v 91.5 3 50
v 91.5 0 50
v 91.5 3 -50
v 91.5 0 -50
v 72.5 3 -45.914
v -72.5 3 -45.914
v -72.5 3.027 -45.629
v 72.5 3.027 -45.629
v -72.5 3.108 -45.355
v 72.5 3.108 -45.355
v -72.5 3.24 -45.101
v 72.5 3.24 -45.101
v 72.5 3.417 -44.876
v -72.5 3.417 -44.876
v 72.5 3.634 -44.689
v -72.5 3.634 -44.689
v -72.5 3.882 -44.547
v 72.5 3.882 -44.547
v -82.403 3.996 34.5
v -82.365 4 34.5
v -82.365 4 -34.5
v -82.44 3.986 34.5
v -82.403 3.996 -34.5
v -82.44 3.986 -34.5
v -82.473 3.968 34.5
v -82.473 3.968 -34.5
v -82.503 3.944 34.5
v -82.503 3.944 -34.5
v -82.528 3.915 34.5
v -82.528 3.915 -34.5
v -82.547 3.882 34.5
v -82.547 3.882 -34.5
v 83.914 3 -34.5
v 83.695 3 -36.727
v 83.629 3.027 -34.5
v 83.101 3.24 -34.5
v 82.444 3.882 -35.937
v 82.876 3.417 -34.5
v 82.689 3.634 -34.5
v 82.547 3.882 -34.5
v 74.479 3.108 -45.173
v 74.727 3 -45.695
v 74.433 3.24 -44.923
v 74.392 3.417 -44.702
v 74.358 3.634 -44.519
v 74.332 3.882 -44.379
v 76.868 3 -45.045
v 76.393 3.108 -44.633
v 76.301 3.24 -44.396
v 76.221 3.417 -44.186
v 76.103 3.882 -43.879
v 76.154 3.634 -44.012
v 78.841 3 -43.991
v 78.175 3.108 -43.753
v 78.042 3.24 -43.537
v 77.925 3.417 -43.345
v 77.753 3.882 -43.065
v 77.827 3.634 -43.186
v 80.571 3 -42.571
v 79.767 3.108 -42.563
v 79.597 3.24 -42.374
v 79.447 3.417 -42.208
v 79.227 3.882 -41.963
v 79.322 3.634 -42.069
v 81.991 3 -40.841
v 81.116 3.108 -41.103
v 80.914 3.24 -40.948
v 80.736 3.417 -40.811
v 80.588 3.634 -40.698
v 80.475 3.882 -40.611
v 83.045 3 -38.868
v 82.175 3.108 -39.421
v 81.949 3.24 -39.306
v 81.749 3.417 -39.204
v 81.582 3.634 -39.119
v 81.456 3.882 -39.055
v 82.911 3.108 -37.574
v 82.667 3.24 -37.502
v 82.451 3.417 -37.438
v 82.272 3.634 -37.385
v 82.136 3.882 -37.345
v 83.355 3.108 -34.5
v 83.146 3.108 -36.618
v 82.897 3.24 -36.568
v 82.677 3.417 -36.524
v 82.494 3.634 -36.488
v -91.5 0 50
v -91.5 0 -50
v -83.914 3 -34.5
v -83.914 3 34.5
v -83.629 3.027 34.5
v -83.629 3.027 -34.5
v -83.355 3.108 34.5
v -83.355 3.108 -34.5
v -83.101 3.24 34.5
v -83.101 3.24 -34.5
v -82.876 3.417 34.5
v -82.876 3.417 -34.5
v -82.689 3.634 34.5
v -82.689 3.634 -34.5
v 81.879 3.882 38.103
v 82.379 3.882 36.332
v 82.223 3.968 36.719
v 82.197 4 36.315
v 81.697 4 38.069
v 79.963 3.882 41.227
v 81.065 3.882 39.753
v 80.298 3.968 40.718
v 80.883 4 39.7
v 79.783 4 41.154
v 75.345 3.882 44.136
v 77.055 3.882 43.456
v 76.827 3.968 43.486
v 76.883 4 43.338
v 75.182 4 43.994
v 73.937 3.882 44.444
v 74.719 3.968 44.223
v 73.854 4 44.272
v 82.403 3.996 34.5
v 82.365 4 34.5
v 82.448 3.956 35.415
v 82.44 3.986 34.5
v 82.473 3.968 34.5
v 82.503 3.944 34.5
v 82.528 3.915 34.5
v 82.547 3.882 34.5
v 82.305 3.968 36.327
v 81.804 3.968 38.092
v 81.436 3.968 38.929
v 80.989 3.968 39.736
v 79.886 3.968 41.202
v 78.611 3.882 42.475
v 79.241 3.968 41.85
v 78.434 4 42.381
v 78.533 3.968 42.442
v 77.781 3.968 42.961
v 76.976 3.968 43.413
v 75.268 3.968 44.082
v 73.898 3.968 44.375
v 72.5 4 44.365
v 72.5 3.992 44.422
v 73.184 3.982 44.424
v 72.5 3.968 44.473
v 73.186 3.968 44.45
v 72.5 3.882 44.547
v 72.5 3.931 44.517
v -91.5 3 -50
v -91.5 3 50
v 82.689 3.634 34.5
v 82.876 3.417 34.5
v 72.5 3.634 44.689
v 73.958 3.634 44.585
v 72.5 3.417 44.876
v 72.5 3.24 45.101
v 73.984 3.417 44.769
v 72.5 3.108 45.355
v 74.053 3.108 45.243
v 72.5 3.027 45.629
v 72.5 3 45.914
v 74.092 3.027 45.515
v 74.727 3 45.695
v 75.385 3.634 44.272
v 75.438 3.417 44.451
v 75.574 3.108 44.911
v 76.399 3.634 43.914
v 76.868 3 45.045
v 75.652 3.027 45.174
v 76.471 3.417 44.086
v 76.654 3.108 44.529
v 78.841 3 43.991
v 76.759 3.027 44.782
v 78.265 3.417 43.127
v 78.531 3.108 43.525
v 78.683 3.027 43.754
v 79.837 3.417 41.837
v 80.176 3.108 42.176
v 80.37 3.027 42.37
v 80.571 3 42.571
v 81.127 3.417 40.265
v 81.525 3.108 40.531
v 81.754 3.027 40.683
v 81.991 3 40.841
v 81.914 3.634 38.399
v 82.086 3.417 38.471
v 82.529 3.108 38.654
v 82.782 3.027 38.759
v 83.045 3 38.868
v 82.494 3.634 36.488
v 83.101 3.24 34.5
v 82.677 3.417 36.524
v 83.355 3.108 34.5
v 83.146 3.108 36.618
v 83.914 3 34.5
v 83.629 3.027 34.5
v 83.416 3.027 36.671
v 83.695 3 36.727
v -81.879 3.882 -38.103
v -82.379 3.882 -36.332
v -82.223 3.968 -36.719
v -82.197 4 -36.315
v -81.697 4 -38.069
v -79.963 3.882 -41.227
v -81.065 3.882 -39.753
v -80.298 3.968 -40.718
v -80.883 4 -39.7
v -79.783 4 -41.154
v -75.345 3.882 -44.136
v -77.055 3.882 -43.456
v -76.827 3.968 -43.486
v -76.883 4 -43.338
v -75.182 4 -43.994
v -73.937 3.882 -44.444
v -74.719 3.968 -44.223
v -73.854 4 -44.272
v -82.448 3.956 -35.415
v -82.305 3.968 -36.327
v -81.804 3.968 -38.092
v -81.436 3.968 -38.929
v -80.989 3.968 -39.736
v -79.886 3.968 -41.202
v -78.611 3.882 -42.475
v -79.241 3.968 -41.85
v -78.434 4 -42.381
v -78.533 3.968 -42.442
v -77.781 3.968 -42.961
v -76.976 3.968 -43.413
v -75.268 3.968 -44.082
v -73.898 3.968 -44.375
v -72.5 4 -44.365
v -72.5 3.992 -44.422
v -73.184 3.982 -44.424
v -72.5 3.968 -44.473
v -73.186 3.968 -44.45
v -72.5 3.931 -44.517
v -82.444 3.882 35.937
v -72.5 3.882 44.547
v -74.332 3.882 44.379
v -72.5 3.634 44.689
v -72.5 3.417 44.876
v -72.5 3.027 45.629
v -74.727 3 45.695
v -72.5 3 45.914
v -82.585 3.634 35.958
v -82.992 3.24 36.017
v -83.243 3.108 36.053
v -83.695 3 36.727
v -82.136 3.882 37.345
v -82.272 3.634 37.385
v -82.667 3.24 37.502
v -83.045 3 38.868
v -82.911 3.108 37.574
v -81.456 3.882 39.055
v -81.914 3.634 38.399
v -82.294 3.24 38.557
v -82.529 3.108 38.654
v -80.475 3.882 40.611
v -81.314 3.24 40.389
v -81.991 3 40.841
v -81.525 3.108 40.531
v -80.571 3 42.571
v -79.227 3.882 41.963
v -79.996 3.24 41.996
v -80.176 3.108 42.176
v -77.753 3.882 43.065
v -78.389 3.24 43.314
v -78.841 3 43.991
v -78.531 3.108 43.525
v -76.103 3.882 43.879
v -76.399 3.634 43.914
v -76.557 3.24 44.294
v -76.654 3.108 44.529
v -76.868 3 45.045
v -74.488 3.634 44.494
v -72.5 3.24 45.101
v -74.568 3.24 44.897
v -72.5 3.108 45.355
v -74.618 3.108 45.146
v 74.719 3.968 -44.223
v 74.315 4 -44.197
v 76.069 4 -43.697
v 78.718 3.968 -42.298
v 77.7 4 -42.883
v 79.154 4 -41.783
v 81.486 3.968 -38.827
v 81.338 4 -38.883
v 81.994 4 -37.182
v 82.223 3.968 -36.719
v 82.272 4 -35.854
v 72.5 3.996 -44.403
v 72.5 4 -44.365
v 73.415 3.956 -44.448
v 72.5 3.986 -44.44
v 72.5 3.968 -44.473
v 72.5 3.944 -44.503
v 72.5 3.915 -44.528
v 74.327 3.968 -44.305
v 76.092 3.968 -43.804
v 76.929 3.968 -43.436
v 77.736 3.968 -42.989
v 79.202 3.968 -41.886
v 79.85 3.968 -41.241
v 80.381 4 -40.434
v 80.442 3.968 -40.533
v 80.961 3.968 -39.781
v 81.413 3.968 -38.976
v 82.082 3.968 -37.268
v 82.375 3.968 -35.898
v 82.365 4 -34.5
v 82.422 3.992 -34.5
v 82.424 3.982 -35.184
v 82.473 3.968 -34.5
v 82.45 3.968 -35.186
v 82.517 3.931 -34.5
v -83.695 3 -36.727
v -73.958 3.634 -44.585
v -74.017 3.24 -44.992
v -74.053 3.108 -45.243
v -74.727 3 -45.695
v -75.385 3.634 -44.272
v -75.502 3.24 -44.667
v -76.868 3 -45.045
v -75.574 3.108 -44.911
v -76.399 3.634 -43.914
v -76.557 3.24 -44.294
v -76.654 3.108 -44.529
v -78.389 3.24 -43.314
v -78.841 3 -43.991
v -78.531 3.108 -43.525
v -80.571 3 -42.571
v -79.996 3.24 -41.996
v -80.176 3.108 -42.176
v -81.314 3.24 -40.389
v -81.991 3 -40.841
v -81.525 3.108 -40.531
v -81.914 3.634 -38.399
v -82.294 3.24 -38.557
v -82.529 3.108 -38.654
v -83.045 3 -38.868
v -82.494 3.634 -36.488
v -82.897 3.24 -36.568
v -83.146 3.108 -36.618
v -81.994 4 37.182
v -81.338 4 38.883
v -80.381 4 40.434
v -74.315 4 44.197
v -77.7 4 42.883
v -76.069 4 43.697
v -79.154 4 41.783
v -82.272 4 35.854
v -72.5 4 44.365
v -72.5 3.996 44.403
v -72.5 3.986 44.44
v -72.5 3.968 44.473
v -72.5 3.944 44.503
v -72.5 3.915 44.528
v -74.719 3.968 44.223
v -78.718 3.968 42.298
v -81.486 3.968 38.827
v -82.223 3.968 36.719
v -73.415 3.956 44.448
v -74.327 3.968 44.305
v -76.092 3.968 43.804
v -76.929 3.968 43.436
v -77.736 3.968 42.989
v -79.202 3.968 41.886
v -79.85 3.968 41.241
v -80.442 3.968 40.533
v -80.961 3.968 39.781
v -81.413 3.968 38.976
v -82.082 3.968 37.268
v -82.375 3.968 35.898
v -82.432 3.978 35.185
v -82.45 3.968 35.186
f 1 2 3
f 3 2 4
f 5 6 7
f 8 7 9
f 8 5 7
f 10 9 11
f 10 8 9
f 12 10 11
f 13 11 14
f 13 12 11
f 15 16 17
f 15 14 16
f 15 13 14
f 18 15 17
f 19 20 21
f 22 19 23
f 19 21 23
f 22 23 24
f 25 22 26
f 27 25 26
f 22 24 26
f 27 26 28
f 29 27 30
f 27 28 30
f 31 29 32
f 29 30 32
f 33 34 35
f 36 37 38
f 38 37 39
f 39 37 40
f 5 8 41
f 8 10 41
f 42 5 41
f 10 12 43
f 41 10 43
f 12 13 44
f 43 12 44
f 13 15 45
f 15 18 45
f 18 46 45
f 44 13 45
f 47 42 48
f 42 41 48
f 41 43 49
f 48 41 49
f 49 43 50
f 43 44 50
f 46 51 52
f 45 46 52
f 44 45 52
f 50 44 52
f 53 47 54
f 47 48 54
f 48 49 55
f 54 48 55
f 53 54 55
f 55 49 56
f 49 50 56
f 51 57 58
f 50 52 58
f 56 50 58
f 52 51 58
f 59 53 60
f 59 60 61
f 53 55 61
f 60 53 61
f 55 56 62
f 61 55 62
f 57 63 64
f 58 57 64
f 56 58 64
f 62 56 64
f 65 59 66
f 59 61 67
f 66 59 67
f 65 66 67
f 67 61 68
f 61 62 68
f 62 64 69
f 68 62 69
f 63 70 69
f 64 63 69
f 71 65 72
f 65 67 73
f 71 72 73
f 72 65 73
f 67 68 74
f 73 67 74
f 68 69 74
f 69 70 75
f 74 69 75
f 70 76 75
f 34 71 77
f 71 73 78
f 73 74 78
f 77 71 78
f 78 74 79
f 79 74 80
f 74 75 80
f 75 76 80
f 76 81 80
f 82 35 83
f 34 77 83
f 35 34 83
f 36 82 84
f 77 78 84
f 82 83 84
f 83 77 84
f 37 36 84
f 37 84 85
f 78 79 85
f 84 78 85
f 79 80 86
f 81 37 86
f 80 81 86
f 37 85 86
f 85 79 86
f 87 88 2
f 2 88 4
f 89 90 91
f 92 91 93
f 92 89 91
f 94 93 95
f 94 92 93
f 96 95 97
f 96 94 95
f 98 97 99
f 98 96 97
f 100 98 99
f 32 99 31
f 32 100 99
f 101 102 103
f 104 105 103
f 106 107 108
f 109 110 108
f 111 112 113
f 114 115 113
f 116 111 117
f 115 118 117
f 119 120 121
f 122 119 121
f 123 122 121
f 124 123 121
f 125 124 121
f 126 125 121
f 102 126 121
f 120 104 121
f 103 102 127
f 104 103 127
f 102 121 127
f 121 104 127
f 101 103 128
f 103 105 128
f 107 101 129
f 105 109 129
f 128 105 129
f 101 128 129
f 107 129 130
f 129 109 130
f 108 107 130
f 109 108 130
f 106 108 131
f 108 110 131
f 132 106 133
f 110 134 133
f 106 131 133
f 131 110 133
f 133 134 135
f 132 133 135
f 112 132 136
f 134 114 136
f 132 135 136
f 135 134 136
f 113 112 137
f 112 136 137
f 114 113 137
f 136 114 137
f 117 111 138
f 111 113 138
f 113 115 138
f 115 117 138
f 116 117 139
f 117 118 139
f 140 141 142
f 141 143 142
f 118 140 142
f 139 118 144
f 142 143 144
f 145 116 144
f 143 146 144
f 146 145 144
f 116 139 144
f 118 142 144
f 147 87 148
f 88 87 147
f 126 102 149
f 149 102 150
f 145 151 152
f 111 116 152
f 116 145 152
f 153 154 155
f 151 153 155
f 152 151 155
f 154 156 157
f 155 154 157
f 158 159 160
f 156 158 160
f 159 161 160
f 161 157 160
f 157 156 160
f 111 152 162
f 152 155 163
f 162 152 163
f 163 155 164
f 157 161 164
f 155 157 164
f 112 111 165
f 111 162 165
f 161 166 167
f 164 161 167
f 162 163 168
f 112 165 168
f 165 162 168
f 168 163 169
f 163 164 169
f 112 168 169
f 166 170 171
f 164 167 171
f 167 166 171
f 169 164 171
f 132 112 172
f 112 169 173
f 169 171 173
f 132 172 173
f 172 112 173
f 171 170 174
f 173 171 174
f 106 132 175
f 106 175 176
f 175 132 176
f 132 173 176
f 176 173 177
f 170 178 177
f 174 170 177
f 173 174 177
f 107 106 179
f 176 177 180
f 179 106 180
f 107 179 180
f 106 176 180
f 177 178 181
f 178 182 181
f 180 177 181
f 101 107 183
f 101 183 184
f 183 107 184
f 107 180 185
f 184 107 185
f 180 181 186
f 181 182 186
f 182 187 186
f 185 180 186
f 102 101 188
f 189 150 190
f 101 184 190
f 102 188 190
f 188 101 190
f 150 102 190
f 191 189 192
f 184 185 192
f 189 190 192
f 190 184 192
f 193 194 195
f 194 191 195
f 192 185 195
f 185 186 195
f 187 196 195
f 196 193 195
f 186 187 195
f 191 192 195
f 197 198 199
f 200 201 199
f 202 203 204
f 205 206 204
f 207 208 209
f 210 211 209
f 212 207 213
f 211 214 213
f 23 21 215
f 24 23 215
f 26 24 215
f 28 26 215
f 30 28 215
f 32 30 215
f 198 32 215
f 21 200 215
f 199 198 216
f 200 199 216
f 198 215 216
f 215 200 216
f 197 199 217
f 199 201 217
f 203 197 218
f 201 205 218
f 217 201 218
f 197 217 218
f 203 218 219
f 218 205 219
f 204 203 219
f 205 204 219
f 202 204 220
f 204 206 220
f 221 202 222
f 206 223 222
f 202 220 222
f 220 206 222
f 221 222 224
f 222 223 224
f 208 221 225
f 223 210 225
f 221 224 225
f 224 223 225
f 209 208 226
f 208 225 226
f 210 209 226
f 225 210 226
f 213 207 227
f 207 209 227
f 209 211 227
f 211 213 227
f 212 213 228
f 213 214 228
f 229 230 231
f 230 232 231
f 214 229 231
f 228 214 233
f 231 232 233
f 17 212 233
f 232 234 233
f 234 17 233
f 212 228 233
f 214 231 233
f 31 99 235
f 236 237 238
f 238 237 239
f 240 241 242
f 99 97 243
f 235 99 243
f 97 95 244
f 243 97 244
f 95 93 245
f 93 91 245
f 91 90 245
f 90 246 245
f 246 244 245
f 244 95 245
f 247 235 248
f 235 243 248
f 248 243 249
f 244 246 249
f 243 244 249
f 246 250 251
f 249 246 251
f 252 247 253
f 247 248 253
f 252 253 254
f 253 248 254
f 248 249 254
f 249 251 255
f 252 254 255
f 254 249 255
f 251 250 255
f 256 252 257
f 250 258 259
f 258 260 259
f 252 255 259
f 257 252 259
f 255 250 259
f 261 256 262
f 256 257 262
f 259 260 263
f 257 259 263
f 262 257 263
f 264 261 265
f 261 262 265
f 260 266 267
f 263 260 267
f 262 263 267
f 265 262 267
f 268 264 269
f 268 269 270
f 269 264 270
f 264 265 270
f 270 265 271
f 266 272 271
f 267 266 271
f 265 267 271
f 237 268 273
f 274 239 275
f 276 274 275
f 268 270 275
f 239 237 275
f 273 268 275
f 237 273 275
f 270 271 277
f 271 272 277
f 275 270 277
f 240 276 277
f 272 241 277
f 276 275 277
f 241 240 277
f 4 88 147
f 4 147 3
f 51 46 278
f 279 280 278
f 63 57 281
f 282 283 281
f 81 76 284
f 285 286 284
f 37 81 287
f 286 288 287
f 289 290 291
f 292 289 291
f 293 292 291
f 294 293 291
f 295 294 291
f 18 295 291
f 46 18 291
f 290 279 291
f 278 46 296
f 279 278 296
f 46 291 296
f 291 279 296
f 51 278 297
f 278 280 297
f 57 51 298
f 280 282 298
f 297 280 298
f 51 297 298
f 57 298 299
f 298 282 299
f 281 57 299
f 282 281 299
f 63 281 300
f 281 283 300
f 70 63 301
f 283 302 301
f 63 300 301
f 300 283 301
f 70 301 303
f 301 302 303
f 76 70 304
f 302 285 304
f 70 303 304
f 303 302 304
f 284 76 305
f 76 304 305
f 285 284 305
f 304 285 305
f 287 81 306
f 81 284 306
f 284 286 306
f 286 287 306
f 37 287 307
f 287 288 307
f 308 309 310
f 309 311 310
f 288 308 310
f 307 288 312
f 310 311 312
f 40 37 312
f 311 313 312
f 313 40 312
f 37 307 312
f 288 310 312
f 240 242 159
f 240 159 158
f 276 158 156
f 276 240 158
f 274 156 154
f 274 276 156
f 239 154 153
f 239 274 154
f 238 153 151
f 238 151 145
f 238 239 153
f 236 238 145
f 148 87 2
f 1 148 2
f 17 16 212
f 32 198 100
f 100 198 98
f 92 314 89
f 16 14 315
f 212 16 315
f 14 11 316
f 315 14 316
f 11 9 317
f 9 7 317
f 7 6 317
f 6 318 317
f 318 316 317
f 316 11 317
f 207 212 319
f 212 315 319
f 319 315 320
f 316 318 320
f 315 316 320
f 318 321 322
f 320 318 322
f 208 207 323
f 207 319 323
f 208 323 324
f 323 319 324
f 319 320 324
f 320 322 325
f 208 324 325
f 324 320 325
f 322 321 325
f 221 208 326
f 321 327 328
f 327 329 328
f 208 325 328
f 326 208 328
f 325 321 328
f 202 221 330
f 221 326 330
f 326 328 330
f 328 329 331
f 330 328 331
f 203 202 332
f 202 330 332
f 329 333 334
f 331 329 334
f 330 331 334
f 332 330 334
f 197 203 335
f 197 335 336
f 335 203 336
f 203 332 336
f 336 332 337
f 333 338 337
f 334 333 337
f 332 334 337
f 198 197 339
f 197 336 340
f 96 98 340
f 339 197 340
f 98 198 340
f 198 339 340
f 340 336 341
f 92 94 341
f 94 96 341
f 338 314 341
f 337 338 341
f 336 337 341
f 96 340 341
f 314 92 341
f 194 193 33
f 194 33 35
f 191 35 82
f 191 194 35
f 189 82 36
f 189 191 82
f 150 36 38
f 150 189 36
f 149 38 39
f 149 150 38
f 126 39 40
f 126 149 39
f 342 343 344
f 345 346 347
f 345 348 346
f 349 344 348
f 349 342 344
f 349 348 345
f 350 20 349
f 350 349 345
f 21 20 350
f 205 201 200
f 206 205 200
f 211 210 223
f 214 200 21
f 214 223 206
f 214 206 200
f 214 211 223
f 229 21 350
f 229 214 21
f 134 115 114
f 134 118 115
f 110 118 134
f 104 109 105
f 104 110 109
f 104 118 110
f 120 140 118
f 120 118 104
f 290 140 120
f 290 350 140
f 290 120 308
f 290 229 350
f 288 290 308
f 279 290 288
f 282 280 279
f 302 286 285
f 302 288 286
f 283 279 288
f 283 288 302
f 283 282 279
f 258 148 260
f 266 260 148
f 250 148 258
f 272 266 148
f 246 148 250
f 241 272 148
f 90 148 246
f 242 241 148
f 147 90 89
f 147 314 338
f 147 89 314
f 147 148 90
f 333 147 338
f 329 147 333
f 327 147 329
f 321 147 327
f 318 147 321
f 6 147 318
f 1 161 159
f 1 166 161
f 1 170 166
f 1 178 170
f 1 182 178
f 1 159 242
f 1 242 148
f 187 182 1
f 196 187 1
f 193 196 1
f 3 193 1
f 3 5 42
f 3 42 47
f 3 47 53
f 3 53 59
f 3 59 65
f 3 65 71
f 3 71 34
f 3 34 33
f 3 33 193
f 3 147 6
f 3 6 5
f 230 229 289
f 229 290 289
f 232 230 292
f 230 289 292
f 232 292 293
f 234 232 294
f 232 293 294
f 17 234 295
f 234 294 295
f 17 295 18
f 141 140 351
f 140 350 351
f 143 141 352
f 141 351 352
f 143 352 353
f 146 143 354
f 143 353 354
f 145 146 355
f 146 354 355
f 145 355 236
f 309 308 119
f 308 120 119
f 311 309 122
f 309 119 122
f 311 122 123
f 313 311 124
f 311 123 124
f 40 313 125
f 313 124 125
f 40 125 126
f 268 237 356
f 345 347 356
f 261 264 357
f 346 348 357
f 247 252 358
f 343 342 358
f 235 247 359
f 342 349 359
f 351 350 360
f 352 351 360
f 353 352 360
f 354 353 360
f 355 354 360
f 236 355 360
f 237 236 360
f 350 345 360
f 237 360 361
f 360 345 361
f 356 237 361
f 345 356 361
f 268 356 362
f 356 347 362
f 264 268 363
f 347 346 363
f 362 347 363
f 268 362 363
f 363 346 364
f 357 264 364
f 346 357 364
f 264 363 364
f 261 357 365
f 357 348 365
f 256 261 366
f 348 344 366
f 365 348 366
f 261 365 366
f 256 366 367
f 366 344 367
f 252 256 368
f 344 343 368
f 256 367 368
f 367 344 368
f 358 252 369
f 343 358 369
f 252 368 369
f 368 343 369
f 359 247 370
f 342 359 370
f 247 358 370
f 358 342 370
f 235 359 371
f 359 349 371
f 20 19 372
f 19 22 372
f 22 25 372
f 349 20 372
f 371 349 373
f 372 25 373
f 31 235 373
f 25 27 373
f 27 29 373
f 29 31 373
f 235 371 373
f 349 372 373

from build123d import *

# Parameters (mm, degrees)
SKETCH_1_W      = 183
SKETCH_1_H      = 100
EXTRUDE_1_DEPTH = 3
SKETCH_2_W      = 165
SKETCH_2_H      = 89
EXTRUDE_2_DEPTH = 1
FILLET_1_R      = 10
FILLET_2_R      = 1.5
FILLET_3_R      = 0.2


with BuildPart() as part:
    # 草图1 → 凸台-拉伸1 (new body)
    with BuildSketch(Plane(origin=(0, 0, 0), x_dir=(1, 0, 0), z_dir=(0, 1, 0))):
        Rectangle(SKETCH_1_W, SKETCH_1_H)
    extrude(amount=EXTRUDE_1_DEPTH)

    # 草图2 → 凸台-拉伸2 (add)
    with BuildSketch(Plane(origin=(0, 3, 0), x_dir=(1, 0, 0), z_dir=(0, 1, 0))):
        Rectangle(SKETCH_2_W, SKETCH_2_H)
    extrude(amount=EXTRUDE_2_DEPTH)

    # 圆角1
    fillet_1_edges = [part.edges().sort_by_distance(p)[0] for p in [
        (-82.5, 3.5, -44.5),
        (-82.5, 3.5, 44.5),
        (82.5, 3.5, 44.5),
        (82.5, 3.5, -44.5),
    ]]
    fillet(fillet_1_edges, radius=FILLET_1_R)

    # 圆角2
    # the kernel refuses this fillet: 1.5 mm, written as the material it adds along each edge
    with BuildSketch(Plane(origin=(-72.5, 3, 34.5), x_dir=(-1, 0, 0), z_dir=(0, 0, -1))) as fillet_2_piece_1:
        with BuildLine():
            CenterArc((11.414213562, 1.5), FILLET_2_R, 199.471220634, 70.528779366)
            Line((10, 1), (9.971715729, 0.99))
            ThreePointArc((9.971715729, 0.99), (9.97, 0.5), (9.97, 0))
            Line((9.97, 0), (10, -0.03))
            Line((10, -0.03), (11.414213562, -0.03))
            Line((11.414213562, -0.03), (11.414213562, 0))
        make_face()
    revolve(axis=Axis((-72.5, 3, 34.5), (0, 1, 0)), revolution_arc=90)
    with BuildSketch(Plane(origin=(-82.5, 3, -34.5), x_dir=(-1, 0, 0), z_dir=(0, 0, 1)), Plane(origin=(82.5, 3, 34.5), x_dir=(1, 0, 0), z_dir=(0, 0, -1))) as fillet_2_piece_2:
        with BuildLine():
            CenterArc((1.414213562, -1.5), FILLET_2_R, 90, 70.528779366)
            Line((0, -1), (-0.028284271, -0.99))
            ThreePointArc((-0.028284271, -0.99), (-0.03, -0.5), (-0.03, 0))
            Line((-0.03, 0), (0, 0.03))
            Line((0, 0.03), (1.414213562, 0.03))
            Line((1.414213562, 0.03), (1.414213562, 0))
        make_face()
    extrude(amount=69)
    with BuildSketch(Plane(origin=(-72.5, 3, -34.5), x_dir=(0, 0, -1), z_dir=(1, 0, 0))) as fillet_2_piece_3:
        with BuildLine():
            CenterArc((11.414213562, 1.5), FILLET_2_R, 199.471220634, 70.528779366)
            Line((10, 1), (9.971715729, 0.99))
            ThreePointArc((9.971715729, 0.99), (9.97, 0.5), (9.97, 0))
            Line((9.97, 0), (10, -0.03))
            Line((10, -0.03), (11.414213562, -0.03))
            Line((11.414213562, -0.03), (11.414213562, 0))
        make_face()
    revolve(axis=Axis((-72.5, 3, -34.5), (0, 1, 0)), revolution_arc=90)
    with BuildSketch(Plane(origin=(72.5, 3, -44.5), x_dir=(0, 0, -1), z_dir=(-1, 0, 0)), Plane(origin=(-72.5, 3, 44.5), x_dir=(0, 0, 1), z_dir=(1, 0, 0))) as fillet_2_piece_4:
        with BuildLine():
            CenterArc((1.414213562, -1.5), FILLET_2_R, 90, 70.528779366)
            Line((0, -1), (-0.028284271, -0.99))
            ThreePointArc((-0.028284271, -0.99), (-0.03, -0.5), (-0.03, 0))
            Line((-0.03, 0), (0, 0.03))
            Line((0, 0.03), (1.414213562, 0.03))
            Line((1.414213562, 0.03), (1.414213562, 0))
        make_face()
    extrude(amount=145)
    with BuildSketch(Plane(origin=(72.5, 3, -34.5), x_dir=(0, 0, -1), z_dir=(-1, 0, 0))) as fillet_2_piece_5:
        with BuildLine():
            CenterArc((11.414213562, -1.5), FILLET_2_R, 90, 70.528779366)
            Line((10, -1), (9.971715729, -0.99))
            ThreePointArc((9.971715729, -0.99), (9.97, -0.5), (9.97, 0))
            Line((9.97, 0), (10, 0.03))
            Line((10, 0.03), (11.414213562, 0.03))
            Line((11.414213562, 0.03), (11.414213562, 0))
        make_face()
    revolve(axis=Axis((72.5, 3, -34.5), (0, -1, 0)), revolution_arc=90)
    with BuildSketch(Plane(origin=(72.5, 3, 34.5), x_dir=(0, 0, 1), z_dir=(-1, 0, 0))) as fillet_2_piece_6:
        with BuildLine():
            CenterArc((11.414213562, 1.5), FILLET_2_R, 199.471220634, 70.528779366)
            Line((10, 1), (9.971715729, 0.99))
            ThreePointArc((9.971715729, 0.99), (9.97, 0.5), (9.97, 0))
            Line((9.97, 0), (10, -0.03))
            Line((10, -0.03), (11.414213562, -0.03))
            Line((11.414213562, -0.03), (11.414213562, 0))
        make_face()
    revolve(axis=Axis((72.5, 3, 34.5), (0, 1, 0)), revolution_arc=90)

    # 圆角3
    fillet_3_edges = [part.edges().sort_by_distance(p)[0] for p in [
        (-82.5, 4, 0),
        (0, 4, -44.5),
        (0, 4, 44.5),
        (82.5, 4, 0),
        (-79.571067812, 4, 41.571067812),
        (79.571067812, 4, 41.571067812),
        (79.571067812, 4, -41.571067812),
        (-79.571067812, 4, -41.571067812),
    ]]
    fillet(fillet_3_edges, radius=FILLET_3_R)


solid = part.part
